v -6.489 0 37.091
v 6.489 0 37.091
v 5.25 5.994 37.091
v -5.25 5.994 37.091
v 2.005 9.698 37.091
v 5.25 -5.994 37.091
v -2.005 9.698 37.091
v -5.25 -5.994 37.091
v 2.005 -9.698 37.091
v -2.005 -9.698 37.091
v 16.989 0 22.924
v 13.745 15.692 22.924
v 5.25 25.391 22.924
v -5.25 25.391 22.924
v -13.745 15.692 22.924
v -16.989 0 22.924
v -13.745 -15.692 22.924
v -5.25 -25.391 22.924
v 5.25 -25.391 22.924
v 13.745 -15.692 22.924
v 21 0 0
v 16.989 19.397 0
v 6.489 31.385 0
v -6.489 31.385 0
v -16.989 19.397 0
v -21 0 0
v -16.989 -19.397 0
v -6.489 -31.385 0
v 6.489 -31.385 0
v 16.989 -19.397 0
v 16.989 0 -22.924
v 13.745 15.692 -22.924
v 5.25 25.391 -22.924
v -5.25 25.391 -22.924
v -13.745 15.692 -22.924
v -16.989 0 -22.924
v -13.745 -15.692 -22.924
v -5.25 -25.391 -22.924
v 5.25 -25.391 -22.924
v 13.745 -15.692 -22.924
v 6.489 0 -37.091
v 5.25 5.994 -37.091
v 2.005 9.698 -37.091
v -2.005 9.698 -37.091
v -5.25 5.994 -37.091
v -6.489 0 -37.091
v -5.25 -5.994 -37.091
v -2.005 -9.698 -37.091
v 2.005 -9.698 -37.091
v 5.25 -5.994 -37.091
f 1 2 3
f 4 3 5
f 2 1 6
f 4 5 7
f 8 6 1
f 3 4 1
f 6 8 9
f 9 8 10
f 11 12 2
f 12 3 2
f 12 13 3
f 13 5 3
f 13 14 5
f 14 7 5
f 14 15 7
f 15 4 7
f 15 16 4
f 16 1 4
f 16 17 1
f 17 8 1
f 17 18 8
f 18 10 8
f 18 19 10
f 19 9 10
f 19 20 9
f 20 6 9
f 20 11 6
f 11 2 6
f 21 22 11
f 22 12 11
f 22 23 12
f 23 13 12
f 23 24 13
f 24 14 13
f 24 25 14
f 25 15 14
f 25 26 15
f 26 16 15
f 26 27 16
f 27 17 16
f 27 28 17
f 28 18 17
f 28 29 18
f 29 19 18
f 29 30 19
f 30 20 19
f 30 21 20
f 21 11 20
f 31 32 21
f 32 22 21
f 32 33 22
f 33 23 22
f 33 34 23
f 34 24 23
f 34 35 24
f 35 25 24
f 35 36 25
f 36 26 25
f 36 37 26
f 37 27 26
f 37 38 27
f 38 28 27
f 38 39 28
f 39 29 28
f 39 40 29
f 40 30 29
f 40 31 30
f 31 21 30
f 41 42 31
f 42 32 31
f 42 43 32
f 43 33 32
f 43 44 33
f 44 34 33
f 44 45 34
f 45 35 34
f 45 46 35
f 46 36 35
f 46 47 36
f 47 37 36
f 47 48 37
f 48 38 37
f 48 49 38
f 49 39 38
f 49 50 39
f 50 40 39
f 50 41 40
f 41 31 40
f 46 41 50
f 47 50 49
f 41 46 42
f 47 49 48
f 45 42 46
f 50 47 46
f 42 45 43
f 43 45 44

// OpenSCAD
// Generated by SolidPython 1.0.1 on 2020-07-29 00:46:47


scale(v = [7, 11, 13]) {
	sphere(r = 3);
}
/***********************************************
*********      SolidPython code:      **********
************************************************
 
# import packages: SolidPython
from solid import *
from solid.utils import *
from itertools import chain, combinations, permutations


class Resize:

    def __init__(self, scad_file):
        self.scad_file = scad_file
        #self.scad_file = import_scad(scad_file)
        # cone/cylinder param:
        self.r1 = 0
        self.r2 = 0
        self.h = 0
        # rectangular prism param:
        self.w = 0
        self.l = 0
        # ellipse param:
        self.r = 0

    # import OpenScad code (file name corresponds to shape)


    # classify shape + parameters
    def assign(self, param1, param2, param3):
        if self.scad_file == 'cone.scad':
            self.r1 = param1
            self.r2 = param2
            self.h = param3
        elif self.scad_file == 'cylinder.scad':
            self.r1 = param1
            self.r2 = param2
            self.h = param3
        elif self.scad_file == 'rectangularPrism.scad':
            self.h = param1
            self.l = param2
            self.w = param3
        else:
            self.r = param1
            self.h = param2

    # resize parameters
    def iterate(self):
        x = range(3, 20, 2)
        i = 1
        if self.scad_file == 'cone.scad':
            tempList = list(permutations(x, 2))
            for temp in tempList:
                param1 = temp[0]
                param2 = temp[1]
                filepath = 'produced_scad_files/' + 'cone' + str(param1) + '_' + str(param2) + '_' + '.scad'
                scad_render_to_file(cylinder(h=param1, r1=param2, r2=0), filepath)

        elif self.scad_file == 'cylinder.scad':
            tempList = list(permutations(x, 3))
            for temp in tempList:
                param1 = temp[0]
                param2 = temp[1]
                filepath = 'produced_scad_files/' + 'cylinder' + str(param1) + '_' + str(param2) + '_' + '.scad'
                scad_render_to_file(cylinder(h=param1, r1=param2, r2=param2), filepath)

        elif self.scad_file == 'rectangularPrism.scad':
            tempList = list(permutations(x, 3))
            for temp in tempList:
                param1 = temp[0]
                param2 = temp[1]
                param3 = temp[2]
                filepath = 'produced_scad_files/' + 'rectangularPrism' + str(param1) + '_' + str(param2) + '_' + str(
                    param3) + '.scad'
                scad_render_to_file(cube(size=(param1, param2, param3)), filepath)

        elif self.scad_file == 'ellipse.scad':
            tempList = list(permutations(x, 4))
            for temp in tempList:
                param1 = temp[0]
                param2 = temp[1]
                param3 = temp[2]
                param4 = temp[3]
                filepath = 'produced_scad_files/' + 'ellipse' + str(param1) + '_' + str(param2) + '_' + str(param3) + '_' + str(param4) + '.scad'
                scad_render_to_file(scale([param1, param2, param3])(sphere(r=param4)), filepath)

    def render_to_scadfile(self):
        scad_render_to_file(scad, 'example.scad') 
 
************************************************/
